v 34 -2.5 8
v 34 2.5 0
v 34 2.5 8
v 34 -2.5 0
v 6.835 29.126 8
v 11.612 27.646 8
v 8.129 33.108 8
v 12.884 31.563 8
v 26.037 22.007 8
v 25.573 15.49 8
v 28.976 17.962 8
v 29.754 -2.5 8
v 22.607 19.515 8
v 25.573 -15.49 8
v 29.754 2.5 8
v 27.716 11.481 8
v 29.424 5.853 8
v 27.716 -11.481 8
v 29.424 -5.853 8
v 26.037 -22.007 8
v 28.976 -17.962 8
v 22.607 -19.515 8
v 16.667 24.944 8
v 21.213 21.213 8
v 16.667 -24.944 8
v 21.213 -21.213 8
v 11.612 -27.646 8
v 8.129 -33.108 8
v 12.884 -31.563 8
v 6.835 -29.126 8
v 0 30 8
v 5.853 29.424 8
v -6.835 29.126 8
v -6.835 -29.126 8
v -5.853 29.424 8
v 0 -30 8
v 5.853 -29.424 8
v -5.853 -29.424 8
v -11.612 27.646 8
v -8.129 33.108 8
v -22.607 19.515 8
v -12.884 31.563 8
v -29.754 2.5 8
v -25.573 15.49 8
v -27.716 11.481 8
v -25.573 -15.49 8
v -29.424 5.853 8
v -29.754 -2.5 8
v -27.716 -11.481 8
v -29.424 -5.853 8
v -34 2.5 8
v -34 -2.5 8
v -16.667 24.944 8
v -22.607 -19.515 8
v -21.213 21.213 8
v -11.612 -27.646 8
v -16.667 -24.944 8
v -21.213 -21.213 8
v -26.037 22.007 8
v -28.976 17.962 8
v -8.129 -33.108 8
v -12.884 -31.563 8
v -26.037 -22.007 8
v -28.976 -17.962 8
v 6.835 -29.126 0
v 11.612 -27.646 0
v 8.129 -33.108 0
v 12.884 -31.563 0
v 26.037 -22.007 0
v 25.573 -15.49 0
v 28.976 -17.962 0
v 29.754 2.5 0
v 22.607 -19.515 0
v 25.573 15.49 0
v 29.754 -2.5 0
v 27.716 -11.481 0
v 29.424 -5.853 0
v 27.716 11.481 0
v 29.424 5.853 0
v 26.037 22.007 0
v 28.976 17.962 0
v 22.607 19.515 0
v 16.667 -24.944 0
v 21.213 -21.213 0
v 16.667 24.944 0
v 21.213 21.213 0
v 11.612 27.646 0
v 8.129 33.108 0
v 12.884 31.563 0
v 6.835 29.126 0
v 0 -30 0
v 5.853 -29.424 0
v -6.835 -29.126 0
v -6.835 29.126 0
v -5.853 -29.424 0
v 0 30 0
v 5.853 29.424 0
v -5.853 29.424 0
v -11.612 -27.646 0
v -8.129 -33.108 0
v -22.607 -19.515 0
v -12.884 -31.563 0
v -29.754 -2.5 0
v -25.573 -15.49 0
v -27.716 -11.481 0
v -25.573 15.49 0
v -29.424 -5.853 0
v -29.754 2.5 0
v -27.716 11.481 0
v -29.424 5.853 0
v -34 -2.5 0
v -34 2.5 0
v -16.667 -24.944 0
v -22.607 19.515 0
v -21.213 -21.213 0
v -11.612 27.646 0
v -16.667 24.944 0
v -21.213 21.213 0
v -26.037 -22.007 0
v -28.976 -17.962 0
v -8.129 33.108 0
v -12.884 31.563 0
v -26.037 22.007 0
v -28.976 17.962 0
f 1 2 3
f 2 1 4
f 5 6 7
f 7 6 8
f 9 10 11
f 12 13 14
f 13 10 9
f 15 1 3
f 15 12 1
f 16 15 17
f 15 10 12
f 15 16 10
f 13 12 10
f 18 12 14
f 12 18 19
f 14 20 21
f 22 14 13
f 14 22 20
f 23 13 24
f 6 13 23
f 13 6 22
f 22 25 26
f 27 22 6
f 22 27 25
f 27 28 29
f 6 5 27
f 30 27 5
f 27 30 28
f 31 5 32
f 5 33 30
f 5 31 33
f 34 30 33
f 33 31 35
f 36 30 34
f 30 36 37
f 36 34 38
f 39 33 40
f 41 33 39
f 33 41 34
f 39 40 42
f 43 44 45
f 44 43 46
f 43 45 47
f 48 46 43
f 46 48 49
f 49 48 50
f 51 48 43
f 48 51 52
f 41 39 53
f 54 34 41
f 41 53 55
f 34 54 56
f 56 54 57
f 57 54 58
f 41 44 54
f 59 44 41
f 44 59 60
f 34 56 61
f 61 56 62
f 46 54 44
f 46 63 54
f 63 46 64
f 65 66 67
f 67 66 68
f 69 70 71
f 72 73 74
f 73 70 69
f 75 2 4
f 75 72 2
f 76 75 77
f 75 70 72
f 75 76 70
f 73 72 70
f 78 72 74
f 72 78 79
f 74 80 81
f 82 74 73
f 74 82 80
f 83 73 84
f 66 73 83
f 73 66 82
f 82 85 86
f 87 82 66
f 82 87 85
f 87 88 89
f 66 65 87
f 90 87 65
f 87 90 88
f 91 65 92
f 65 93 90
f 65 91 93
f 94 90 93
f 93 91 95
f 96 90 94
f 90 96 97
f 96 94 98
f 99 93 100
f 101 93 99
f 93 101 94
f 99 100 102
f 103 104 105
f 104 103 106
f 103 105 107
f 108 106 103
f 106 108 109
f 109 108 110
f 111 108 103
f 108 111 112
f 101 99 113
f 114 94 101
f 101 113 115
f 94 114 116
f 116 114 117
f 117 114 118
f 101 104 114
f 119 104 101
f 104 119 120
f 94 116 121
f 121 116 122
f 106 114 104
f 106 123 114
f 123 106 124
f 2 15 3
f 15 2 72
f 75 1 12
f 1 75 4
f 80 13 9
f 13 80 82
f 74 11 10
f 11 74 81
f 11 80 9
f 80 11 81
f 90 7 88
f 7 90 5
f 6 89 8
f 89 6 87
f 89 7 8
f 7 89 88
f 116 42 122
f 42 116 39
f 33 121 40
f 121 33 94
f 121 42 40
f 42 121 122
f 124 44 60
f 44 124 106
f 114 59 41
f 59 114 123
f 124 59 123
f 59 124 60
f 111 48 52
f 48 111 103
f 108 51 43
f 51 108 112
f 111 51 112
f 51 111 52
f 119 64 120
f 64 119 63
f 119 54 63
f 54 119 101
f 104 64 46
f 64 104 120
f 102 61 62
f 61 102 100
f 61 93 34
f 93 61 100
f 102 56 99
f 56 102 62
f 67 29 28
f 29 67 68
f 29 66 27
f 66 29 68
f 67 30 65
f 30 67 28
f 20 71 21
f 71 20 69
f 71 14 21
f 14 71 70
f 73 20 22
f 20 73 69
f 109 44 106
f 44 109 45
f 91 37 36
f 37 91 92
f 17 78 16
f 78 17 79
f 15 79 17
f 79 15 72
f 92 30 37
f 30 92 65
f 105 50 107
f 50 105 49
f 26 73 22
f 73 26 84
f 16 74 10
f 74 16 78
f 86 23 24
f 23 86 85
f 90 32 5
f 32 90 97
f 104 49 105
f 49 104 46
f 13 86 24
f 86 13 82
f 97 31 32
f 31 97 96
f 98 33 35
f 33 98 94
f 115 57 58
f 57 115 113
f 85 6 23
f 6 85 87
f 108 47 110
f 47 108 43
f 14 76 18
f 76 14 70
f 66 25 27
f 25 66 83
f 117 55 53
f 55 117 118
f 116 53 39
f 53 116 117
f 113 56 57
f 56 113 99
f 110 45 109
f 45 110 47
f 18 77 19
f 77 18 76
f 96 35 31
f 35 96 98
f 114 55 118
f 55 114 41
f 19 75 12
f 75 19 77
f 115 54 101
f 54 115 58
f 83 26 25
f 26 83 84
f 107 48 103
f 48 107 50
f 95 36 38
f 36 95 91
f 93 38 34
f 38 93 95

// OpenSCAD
$fn = 32;

// ----------------------------------------------------------------------
// Spur blank: plain gear blank
// ----------------------------------------------------------------------

// --- parameters (mm) ---
disc_r = 30;              // blank root radius
disc_t = 8;               // blank thickness
n_teeth = 10;             // stub tooth count
tooth_w = 5;              // tooth width at the root
tooth_h = 4;              // tooth height above the root

out_r = disc_r + tooth_h;  // tip radius
bbox_x = 68.0;  // measured width over the teeth
bbox_y = 66.22;  // measured depth over the teeth

union() {
  cylinder(r = disc_r, h = disc_t);
  for (i = [0 : n_teeth - 1])
    rotate([0, 0, i * 360 / n_teeth])
      translate([disc_r - 1, -tooth_w / 2, 0])
        cube([tooth_h + 1, tooth_w, disc_t]);
}
